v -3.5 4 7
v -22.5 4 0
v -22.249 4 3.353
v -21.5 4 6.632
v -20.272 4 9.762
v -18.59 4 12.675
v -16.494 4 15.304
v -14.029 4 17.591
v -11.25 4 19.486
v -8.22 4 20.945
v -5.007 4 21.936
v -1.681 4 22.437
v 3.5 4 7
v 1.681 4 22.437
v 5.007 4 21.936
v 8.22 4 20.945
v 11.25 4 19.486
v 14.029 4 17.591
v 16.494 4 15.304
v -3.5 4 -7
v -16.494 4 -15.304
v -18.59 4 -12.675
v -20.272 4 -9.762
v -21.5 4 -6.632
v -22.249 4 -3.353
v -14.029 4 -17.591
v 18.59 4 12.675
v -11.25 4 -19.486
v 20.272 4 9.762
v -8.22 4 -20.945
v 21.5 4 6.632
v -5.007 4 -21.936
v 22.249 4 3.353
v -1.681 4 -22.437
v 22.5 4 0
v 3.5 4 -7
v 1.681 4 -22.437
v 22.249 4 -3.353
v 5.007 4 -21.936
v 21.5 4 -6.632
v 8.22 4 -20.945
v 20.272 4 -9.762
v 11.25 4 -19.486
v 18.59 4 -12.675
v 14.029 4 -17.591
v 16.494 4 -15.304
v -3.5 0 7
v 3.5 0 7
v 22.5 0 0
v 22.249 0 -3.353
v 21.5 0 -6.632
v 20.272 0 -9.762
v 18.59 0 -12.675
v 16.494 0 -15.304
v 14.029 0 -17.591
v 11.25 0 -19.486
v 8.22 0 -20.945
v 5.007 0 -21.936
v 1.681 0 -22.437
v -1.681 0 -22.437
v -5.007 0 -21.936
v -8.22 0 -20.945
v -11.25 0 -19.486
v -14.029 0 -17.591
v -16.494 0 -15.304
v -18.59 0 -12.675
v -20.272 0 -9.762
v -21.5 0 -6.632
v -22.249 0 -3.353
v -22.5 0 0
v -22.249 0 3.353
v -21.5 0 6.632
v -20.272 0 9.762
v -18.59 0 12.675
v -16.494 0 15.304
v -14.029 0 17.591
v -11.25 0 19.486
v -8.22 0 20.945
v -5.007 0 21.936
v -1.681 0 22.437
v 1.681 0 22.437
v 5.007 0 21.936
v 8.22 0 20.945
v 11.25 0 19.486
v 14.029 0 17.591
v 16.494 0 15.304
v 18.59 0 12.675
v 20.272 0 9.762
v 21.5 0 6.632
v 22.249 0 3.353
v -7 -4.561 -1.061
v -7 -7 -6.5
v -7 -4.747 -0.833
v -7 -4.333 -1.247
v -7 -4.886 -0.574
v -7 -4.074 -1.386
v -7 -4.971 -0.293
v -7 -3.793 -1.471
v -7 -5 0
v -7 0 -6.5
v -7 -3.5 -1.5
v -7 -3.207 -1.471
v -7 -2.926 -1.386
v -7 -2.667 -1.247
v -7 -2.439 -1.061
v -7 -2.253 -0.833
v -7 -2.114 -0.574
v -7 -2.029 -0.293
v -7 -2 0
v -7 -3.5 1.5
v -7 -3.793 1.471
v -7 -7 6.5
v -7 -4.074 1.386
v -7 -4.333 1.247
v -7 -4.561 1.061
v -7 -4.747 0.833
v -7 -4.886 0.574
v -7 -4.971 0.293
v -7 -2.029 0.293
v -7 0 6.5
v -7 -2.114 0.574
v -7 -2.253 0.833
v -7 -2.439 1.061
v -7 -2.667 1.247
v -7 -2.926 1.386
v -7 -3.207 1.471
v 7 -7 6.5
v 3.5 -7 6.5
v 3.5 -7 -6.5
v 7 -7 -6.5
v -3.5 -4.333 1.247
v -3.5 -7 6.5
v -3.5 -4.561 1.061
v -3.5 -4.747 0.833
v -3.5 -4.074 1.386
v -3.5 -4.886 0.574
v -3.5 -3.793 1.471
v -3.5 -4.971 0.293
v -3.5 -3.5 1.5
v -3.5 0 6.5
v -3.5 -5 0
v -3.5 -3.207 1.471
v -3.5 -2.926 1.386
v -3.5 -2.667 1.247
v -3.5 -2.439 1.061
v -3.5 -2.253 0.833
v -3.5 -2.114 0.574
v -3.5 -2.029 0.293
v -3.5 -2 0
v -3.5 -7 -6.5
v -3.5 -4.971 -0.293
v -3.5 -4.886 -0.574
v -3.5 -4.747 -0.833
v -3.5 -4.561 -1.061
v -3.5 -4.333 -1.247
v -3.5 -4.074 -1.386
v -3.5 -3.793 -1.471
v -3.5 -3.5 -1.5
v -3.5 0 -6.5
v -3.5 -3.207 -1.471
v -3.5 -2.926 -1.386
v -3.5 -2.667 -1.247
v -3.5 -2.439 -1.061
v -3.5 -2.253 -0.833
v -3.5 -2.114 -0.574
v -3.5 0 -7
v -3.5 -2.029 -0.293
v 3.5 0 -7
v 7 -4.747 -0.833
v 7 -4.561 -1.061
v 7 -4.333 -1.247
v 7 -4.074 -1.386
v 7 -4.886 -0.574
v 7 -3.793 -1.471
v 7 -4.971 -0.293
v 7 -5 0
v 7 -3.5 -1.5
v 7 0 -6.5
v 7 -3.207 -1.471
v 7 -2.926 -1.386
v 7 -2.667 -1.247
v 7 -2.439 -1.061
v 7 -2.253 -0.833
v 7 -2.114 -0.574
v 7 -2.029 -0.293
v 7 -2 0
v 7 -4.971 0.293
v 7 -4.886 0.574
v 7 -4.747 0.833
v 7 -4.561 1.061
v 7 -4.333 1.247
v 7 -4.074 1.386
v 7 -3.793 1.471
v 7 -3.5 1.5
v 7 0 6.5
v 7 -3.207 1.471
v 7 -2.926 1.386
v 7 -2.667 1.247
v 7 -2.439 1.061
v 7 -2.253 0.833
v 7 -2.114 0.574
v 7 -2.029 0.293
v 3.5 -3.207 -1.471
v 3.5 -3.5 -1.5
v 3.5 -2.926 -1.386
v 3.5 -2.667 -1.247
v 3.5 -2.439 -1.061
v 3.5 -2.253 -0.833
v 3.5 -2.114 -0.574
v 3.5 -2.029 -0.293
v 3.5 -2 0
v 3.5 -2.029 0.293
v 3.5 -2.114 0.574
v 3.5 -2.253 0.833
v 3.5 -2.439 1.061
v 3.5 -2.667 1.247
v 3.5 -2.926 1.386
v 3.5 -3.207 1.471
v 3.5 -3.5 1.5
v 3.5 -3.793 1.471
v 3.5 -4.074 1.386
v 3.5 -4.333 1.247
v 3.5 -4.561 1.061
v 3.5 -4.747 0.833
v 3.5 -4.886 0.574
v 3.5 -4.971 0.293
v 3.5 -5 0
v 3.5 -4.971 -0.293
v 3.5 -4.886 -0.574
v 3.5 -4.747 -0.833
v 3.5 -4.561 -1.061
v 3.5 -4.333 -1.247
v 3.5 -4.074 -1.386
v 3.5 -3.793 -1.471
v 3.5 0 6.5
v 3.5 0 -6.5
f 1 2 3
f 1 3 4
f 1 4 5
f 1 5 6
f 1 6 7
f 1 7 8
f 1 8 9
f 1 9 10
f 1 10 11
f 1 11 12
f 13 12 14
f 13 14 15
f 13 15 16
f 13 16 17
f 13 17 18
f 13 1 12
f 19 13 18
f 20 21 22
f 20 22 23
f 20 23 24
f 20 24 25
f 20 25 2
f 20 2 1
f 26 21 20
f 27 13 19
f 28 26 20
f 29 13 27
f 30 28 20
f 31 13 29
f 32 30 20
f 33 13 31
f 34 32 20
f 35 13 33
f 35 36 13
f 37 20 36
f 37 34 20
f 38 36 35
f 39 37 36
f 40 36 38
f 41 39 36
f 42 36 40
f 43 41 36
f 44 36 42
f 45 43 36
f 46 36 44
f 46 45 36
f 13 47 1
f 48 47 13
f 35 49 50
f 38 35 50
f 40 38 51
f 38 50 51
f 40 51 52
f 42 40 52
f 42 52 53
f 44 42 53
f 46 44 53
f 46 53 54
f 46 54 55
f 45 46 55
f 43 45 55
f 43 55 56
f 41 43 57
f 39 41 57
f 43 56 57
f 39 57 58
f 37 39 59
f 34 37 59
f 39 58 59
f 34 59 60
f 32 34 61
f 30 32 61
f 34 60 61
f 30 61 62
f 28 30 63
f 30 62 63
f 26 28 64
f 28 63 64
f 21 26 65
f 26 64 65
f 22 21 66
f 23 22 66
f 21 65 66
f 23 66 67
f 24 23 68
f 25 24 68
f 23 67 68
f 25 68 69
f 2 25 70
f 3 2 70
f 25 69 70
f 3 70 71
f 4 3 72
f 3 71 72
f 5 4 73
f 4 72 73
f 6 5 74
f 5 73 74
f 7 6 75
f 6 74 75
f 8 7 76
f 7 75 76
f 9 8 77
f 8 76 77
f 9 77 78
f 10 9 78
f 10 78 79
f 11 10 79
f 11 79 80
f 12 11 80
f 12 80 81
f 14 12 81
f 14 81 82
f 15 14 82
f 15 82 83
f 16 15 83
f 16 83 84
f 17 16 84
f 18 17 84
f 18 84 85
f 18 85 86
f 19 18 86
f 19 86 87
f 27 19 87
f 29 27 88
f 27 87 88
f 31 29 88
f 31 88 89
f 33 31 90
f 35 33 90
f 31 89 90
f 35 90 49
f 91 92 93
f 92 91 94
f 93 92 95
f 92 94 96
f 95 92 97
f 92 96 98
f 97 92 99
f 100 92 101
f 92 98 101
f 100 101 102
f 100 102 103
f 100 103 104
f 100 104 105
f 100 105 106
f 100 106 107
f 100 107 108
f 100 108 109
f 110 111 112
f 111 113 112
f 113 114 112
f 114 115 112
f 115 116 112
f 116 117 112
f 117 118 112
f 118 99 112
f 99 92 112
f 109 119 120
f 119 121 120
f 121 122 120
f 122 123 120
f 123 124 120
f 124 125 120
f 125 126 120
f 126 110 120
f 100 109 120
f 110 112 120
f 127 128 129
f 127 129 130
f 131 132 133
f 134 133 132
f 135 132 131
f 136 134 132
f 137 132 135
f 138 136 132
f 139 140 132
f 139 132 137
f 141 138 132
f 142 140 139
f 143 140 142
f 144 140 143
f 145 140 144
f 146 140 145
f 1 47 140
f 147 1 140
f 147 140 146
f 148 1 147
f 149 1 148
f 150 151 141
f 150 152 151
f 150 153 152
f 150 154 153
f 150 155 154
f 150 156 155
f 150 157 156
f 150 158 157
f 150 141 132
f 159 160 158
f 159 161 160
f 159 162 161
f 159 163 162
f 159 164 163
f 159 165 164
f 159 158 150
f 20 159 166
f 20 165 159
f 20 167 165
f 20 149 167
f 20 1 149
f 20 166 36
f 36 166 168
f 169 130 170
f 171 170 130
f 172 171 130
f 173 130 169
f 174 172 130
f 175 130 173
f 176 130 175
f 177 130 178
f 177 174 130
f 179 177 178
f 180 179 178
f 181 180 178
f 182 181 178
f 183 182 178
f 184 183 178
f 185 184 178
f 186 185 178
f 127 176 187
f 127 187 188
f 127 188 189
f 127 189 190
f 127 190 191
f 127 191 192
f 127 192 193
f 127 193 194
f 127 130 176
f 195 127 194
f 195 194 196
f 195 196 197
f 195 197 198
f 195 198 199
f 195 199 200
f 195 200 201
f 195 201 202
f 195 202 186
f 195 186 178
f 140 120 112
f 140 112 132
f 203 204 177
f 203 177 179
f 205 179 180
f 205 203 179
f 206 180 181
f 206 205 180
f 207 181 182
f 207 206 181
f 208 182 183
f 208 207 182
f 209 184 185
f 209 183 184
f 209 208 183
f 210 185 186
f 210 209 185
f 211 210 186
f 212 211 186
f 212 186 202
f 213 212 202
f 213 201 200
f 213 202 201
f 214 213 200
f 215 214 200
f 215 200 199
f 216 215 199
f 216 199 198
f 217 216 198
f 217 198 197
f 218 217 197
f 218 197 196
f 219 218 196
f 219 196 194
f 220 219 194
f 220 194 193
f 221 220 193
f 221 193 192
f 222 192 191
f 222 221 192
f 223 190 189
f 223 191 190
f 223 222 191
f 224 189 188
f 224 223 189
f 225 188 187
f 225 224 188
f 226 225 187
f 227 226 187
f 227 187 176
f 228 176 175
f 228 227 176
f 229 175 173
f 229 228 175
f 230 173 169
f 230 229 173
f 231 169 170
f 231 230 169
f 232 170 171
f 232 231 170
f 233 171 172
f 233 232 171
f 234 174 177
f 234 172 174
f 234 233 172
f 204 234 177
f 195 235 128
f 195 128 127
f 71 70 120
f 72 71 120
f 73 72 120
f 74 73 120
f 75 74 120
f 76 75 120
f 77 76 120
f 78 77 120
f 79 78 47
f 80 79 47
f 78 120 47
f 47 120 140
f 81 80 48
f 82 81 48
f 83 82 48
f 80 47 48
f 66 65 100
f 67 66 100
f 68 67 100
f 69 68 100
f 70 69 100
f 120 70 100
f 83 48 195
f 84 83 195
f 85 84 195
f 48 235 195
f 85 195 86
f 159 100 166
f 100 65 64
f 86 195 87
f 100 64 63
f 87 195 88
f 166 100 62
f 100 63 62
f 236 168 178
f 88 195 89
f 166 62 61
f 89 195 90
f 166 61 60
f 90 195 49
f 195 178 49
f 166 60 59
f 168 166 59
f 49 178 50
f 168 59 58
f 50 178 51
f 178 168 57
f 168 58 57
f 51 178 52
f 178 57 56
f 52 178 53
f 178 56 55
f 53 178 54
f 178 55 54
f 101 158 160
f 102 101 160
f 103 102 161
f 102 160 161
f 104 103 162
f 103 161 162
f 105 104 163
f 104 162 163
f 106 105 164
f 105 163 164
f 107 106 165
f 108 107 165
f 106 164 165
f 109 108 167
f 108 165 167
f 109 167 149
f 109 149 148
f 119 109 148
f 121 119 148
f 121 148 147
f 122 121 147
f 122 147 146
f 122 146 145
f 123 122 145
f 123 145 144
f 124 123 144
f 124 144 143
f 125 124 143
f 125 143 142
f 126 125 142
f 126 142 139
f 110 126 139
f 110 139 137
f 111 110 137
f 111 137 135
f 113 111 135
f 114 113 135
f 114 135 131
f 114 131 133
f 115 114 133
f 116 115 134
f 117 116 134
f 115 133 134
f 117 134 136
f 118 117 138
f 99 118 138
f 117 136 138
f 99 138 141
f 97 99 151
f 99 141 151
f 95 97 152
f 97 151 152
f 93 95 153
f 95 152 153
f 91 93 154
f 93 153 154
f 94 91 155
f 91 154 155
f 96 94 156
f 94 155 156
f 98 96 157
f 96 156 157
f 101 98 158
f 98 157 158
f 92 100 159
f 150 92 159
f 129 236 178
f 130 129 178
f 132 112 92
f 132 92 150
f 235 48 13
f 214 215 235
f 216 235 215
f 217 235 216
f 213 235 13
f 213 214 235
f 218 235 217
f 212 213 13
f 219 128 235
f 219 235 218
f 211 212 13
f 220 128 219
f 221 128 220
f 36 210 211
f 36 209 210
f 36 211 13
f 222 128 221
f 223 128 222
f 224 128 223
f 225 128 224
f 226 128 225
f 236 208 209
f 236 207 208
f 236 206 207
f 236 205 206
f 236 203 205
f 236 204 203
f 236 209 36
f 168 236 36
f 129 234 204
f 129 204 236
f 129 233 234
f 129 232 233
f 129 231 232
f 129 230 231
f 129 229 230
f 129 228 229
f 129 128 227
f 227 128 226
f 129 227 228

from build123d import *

# Parameters (mm, degrees)
SKETCH1_R               = 22.5
BOSS_EXTRUDE1_DEPTH     = 4
SKETCH3_W               = 14
SKETCH3_H               = 11
BOSS_EXTRUDE2_DEPTH     = 6.5
SKETCH4_W               = 7
SKETCH4_H               = 14
CUT_EXTRUDE1_DEPTH      = 5
CUT_EXTRUDE1_DEPTH_BACK = 8
SKETCH5_R               = 1.5
CUT_EXTRUDE2_DEPTH      = 23.5
CUT_EXTRUDE2_DEPTH_BACK = 23.5


with BuildPart() as part:
    # Sketch1 → Boss-Extrude1 (new body)
    with BuildSketch(Plane(origin=(0, 0, 0), x_dir=(1, 0, 0), z_dir=(0, 1, 0))):
        Circle(SKETCH1_R)
    extrude(amount=BOSS_EXTRUDE1_DEPTH)

    # Sketch3 → Boss-Extrude2 (add, symmetric)
    with BuildSketch(Plane.XY):
        with Locations((0, -1.5)):
            Rectangle(SKETCH3_W, SKETCH3_H)
    extrude(amount=BOSS_EXTRUDE2_DEPTH, both=True)

    # Sketch4 → Cut-Extrude1 (cut, two sides)
    with BuildSketch(Plane(origin=(0, 0, 0), x_dir=(1, 0, 0), z_dir=(0, 1, 0))) as cut_extrude1_sk:
        Rectangle(SKETCH4_W, SKETCH4_H)
    extrude(amount=CUT_EXTRUDE1_DEPTH, mode=Mode.SUBTRACT)
    extrude(cut_extrude1_sk.sketch, amount=-CUT_EXTRUDE1_DEPTH_BACK, mode=Mode.SUBTRACT)

    # Sketch5 → Cut-Extrude2 (cut, two sides)
    with BuildSketch(Plane(origin=(0, 0, 0), x_dir=(0, 0, -1), z_dir=(1, 0, 0))) as cut_extrude2_sk:
        with Locations((0, -3.5)):
            Circle(SKETCH5_R)
    extrude(amount=CUT_EXTRUDE2_DEPTH, mode=Mode.SUBTRACT)
    extrude(cut_extrude2_sk.sketch, amount=-CUT_EXTRUDE2_DEPTH_BACK, mode=Mode.SUBTRACT)


solid = part.part
